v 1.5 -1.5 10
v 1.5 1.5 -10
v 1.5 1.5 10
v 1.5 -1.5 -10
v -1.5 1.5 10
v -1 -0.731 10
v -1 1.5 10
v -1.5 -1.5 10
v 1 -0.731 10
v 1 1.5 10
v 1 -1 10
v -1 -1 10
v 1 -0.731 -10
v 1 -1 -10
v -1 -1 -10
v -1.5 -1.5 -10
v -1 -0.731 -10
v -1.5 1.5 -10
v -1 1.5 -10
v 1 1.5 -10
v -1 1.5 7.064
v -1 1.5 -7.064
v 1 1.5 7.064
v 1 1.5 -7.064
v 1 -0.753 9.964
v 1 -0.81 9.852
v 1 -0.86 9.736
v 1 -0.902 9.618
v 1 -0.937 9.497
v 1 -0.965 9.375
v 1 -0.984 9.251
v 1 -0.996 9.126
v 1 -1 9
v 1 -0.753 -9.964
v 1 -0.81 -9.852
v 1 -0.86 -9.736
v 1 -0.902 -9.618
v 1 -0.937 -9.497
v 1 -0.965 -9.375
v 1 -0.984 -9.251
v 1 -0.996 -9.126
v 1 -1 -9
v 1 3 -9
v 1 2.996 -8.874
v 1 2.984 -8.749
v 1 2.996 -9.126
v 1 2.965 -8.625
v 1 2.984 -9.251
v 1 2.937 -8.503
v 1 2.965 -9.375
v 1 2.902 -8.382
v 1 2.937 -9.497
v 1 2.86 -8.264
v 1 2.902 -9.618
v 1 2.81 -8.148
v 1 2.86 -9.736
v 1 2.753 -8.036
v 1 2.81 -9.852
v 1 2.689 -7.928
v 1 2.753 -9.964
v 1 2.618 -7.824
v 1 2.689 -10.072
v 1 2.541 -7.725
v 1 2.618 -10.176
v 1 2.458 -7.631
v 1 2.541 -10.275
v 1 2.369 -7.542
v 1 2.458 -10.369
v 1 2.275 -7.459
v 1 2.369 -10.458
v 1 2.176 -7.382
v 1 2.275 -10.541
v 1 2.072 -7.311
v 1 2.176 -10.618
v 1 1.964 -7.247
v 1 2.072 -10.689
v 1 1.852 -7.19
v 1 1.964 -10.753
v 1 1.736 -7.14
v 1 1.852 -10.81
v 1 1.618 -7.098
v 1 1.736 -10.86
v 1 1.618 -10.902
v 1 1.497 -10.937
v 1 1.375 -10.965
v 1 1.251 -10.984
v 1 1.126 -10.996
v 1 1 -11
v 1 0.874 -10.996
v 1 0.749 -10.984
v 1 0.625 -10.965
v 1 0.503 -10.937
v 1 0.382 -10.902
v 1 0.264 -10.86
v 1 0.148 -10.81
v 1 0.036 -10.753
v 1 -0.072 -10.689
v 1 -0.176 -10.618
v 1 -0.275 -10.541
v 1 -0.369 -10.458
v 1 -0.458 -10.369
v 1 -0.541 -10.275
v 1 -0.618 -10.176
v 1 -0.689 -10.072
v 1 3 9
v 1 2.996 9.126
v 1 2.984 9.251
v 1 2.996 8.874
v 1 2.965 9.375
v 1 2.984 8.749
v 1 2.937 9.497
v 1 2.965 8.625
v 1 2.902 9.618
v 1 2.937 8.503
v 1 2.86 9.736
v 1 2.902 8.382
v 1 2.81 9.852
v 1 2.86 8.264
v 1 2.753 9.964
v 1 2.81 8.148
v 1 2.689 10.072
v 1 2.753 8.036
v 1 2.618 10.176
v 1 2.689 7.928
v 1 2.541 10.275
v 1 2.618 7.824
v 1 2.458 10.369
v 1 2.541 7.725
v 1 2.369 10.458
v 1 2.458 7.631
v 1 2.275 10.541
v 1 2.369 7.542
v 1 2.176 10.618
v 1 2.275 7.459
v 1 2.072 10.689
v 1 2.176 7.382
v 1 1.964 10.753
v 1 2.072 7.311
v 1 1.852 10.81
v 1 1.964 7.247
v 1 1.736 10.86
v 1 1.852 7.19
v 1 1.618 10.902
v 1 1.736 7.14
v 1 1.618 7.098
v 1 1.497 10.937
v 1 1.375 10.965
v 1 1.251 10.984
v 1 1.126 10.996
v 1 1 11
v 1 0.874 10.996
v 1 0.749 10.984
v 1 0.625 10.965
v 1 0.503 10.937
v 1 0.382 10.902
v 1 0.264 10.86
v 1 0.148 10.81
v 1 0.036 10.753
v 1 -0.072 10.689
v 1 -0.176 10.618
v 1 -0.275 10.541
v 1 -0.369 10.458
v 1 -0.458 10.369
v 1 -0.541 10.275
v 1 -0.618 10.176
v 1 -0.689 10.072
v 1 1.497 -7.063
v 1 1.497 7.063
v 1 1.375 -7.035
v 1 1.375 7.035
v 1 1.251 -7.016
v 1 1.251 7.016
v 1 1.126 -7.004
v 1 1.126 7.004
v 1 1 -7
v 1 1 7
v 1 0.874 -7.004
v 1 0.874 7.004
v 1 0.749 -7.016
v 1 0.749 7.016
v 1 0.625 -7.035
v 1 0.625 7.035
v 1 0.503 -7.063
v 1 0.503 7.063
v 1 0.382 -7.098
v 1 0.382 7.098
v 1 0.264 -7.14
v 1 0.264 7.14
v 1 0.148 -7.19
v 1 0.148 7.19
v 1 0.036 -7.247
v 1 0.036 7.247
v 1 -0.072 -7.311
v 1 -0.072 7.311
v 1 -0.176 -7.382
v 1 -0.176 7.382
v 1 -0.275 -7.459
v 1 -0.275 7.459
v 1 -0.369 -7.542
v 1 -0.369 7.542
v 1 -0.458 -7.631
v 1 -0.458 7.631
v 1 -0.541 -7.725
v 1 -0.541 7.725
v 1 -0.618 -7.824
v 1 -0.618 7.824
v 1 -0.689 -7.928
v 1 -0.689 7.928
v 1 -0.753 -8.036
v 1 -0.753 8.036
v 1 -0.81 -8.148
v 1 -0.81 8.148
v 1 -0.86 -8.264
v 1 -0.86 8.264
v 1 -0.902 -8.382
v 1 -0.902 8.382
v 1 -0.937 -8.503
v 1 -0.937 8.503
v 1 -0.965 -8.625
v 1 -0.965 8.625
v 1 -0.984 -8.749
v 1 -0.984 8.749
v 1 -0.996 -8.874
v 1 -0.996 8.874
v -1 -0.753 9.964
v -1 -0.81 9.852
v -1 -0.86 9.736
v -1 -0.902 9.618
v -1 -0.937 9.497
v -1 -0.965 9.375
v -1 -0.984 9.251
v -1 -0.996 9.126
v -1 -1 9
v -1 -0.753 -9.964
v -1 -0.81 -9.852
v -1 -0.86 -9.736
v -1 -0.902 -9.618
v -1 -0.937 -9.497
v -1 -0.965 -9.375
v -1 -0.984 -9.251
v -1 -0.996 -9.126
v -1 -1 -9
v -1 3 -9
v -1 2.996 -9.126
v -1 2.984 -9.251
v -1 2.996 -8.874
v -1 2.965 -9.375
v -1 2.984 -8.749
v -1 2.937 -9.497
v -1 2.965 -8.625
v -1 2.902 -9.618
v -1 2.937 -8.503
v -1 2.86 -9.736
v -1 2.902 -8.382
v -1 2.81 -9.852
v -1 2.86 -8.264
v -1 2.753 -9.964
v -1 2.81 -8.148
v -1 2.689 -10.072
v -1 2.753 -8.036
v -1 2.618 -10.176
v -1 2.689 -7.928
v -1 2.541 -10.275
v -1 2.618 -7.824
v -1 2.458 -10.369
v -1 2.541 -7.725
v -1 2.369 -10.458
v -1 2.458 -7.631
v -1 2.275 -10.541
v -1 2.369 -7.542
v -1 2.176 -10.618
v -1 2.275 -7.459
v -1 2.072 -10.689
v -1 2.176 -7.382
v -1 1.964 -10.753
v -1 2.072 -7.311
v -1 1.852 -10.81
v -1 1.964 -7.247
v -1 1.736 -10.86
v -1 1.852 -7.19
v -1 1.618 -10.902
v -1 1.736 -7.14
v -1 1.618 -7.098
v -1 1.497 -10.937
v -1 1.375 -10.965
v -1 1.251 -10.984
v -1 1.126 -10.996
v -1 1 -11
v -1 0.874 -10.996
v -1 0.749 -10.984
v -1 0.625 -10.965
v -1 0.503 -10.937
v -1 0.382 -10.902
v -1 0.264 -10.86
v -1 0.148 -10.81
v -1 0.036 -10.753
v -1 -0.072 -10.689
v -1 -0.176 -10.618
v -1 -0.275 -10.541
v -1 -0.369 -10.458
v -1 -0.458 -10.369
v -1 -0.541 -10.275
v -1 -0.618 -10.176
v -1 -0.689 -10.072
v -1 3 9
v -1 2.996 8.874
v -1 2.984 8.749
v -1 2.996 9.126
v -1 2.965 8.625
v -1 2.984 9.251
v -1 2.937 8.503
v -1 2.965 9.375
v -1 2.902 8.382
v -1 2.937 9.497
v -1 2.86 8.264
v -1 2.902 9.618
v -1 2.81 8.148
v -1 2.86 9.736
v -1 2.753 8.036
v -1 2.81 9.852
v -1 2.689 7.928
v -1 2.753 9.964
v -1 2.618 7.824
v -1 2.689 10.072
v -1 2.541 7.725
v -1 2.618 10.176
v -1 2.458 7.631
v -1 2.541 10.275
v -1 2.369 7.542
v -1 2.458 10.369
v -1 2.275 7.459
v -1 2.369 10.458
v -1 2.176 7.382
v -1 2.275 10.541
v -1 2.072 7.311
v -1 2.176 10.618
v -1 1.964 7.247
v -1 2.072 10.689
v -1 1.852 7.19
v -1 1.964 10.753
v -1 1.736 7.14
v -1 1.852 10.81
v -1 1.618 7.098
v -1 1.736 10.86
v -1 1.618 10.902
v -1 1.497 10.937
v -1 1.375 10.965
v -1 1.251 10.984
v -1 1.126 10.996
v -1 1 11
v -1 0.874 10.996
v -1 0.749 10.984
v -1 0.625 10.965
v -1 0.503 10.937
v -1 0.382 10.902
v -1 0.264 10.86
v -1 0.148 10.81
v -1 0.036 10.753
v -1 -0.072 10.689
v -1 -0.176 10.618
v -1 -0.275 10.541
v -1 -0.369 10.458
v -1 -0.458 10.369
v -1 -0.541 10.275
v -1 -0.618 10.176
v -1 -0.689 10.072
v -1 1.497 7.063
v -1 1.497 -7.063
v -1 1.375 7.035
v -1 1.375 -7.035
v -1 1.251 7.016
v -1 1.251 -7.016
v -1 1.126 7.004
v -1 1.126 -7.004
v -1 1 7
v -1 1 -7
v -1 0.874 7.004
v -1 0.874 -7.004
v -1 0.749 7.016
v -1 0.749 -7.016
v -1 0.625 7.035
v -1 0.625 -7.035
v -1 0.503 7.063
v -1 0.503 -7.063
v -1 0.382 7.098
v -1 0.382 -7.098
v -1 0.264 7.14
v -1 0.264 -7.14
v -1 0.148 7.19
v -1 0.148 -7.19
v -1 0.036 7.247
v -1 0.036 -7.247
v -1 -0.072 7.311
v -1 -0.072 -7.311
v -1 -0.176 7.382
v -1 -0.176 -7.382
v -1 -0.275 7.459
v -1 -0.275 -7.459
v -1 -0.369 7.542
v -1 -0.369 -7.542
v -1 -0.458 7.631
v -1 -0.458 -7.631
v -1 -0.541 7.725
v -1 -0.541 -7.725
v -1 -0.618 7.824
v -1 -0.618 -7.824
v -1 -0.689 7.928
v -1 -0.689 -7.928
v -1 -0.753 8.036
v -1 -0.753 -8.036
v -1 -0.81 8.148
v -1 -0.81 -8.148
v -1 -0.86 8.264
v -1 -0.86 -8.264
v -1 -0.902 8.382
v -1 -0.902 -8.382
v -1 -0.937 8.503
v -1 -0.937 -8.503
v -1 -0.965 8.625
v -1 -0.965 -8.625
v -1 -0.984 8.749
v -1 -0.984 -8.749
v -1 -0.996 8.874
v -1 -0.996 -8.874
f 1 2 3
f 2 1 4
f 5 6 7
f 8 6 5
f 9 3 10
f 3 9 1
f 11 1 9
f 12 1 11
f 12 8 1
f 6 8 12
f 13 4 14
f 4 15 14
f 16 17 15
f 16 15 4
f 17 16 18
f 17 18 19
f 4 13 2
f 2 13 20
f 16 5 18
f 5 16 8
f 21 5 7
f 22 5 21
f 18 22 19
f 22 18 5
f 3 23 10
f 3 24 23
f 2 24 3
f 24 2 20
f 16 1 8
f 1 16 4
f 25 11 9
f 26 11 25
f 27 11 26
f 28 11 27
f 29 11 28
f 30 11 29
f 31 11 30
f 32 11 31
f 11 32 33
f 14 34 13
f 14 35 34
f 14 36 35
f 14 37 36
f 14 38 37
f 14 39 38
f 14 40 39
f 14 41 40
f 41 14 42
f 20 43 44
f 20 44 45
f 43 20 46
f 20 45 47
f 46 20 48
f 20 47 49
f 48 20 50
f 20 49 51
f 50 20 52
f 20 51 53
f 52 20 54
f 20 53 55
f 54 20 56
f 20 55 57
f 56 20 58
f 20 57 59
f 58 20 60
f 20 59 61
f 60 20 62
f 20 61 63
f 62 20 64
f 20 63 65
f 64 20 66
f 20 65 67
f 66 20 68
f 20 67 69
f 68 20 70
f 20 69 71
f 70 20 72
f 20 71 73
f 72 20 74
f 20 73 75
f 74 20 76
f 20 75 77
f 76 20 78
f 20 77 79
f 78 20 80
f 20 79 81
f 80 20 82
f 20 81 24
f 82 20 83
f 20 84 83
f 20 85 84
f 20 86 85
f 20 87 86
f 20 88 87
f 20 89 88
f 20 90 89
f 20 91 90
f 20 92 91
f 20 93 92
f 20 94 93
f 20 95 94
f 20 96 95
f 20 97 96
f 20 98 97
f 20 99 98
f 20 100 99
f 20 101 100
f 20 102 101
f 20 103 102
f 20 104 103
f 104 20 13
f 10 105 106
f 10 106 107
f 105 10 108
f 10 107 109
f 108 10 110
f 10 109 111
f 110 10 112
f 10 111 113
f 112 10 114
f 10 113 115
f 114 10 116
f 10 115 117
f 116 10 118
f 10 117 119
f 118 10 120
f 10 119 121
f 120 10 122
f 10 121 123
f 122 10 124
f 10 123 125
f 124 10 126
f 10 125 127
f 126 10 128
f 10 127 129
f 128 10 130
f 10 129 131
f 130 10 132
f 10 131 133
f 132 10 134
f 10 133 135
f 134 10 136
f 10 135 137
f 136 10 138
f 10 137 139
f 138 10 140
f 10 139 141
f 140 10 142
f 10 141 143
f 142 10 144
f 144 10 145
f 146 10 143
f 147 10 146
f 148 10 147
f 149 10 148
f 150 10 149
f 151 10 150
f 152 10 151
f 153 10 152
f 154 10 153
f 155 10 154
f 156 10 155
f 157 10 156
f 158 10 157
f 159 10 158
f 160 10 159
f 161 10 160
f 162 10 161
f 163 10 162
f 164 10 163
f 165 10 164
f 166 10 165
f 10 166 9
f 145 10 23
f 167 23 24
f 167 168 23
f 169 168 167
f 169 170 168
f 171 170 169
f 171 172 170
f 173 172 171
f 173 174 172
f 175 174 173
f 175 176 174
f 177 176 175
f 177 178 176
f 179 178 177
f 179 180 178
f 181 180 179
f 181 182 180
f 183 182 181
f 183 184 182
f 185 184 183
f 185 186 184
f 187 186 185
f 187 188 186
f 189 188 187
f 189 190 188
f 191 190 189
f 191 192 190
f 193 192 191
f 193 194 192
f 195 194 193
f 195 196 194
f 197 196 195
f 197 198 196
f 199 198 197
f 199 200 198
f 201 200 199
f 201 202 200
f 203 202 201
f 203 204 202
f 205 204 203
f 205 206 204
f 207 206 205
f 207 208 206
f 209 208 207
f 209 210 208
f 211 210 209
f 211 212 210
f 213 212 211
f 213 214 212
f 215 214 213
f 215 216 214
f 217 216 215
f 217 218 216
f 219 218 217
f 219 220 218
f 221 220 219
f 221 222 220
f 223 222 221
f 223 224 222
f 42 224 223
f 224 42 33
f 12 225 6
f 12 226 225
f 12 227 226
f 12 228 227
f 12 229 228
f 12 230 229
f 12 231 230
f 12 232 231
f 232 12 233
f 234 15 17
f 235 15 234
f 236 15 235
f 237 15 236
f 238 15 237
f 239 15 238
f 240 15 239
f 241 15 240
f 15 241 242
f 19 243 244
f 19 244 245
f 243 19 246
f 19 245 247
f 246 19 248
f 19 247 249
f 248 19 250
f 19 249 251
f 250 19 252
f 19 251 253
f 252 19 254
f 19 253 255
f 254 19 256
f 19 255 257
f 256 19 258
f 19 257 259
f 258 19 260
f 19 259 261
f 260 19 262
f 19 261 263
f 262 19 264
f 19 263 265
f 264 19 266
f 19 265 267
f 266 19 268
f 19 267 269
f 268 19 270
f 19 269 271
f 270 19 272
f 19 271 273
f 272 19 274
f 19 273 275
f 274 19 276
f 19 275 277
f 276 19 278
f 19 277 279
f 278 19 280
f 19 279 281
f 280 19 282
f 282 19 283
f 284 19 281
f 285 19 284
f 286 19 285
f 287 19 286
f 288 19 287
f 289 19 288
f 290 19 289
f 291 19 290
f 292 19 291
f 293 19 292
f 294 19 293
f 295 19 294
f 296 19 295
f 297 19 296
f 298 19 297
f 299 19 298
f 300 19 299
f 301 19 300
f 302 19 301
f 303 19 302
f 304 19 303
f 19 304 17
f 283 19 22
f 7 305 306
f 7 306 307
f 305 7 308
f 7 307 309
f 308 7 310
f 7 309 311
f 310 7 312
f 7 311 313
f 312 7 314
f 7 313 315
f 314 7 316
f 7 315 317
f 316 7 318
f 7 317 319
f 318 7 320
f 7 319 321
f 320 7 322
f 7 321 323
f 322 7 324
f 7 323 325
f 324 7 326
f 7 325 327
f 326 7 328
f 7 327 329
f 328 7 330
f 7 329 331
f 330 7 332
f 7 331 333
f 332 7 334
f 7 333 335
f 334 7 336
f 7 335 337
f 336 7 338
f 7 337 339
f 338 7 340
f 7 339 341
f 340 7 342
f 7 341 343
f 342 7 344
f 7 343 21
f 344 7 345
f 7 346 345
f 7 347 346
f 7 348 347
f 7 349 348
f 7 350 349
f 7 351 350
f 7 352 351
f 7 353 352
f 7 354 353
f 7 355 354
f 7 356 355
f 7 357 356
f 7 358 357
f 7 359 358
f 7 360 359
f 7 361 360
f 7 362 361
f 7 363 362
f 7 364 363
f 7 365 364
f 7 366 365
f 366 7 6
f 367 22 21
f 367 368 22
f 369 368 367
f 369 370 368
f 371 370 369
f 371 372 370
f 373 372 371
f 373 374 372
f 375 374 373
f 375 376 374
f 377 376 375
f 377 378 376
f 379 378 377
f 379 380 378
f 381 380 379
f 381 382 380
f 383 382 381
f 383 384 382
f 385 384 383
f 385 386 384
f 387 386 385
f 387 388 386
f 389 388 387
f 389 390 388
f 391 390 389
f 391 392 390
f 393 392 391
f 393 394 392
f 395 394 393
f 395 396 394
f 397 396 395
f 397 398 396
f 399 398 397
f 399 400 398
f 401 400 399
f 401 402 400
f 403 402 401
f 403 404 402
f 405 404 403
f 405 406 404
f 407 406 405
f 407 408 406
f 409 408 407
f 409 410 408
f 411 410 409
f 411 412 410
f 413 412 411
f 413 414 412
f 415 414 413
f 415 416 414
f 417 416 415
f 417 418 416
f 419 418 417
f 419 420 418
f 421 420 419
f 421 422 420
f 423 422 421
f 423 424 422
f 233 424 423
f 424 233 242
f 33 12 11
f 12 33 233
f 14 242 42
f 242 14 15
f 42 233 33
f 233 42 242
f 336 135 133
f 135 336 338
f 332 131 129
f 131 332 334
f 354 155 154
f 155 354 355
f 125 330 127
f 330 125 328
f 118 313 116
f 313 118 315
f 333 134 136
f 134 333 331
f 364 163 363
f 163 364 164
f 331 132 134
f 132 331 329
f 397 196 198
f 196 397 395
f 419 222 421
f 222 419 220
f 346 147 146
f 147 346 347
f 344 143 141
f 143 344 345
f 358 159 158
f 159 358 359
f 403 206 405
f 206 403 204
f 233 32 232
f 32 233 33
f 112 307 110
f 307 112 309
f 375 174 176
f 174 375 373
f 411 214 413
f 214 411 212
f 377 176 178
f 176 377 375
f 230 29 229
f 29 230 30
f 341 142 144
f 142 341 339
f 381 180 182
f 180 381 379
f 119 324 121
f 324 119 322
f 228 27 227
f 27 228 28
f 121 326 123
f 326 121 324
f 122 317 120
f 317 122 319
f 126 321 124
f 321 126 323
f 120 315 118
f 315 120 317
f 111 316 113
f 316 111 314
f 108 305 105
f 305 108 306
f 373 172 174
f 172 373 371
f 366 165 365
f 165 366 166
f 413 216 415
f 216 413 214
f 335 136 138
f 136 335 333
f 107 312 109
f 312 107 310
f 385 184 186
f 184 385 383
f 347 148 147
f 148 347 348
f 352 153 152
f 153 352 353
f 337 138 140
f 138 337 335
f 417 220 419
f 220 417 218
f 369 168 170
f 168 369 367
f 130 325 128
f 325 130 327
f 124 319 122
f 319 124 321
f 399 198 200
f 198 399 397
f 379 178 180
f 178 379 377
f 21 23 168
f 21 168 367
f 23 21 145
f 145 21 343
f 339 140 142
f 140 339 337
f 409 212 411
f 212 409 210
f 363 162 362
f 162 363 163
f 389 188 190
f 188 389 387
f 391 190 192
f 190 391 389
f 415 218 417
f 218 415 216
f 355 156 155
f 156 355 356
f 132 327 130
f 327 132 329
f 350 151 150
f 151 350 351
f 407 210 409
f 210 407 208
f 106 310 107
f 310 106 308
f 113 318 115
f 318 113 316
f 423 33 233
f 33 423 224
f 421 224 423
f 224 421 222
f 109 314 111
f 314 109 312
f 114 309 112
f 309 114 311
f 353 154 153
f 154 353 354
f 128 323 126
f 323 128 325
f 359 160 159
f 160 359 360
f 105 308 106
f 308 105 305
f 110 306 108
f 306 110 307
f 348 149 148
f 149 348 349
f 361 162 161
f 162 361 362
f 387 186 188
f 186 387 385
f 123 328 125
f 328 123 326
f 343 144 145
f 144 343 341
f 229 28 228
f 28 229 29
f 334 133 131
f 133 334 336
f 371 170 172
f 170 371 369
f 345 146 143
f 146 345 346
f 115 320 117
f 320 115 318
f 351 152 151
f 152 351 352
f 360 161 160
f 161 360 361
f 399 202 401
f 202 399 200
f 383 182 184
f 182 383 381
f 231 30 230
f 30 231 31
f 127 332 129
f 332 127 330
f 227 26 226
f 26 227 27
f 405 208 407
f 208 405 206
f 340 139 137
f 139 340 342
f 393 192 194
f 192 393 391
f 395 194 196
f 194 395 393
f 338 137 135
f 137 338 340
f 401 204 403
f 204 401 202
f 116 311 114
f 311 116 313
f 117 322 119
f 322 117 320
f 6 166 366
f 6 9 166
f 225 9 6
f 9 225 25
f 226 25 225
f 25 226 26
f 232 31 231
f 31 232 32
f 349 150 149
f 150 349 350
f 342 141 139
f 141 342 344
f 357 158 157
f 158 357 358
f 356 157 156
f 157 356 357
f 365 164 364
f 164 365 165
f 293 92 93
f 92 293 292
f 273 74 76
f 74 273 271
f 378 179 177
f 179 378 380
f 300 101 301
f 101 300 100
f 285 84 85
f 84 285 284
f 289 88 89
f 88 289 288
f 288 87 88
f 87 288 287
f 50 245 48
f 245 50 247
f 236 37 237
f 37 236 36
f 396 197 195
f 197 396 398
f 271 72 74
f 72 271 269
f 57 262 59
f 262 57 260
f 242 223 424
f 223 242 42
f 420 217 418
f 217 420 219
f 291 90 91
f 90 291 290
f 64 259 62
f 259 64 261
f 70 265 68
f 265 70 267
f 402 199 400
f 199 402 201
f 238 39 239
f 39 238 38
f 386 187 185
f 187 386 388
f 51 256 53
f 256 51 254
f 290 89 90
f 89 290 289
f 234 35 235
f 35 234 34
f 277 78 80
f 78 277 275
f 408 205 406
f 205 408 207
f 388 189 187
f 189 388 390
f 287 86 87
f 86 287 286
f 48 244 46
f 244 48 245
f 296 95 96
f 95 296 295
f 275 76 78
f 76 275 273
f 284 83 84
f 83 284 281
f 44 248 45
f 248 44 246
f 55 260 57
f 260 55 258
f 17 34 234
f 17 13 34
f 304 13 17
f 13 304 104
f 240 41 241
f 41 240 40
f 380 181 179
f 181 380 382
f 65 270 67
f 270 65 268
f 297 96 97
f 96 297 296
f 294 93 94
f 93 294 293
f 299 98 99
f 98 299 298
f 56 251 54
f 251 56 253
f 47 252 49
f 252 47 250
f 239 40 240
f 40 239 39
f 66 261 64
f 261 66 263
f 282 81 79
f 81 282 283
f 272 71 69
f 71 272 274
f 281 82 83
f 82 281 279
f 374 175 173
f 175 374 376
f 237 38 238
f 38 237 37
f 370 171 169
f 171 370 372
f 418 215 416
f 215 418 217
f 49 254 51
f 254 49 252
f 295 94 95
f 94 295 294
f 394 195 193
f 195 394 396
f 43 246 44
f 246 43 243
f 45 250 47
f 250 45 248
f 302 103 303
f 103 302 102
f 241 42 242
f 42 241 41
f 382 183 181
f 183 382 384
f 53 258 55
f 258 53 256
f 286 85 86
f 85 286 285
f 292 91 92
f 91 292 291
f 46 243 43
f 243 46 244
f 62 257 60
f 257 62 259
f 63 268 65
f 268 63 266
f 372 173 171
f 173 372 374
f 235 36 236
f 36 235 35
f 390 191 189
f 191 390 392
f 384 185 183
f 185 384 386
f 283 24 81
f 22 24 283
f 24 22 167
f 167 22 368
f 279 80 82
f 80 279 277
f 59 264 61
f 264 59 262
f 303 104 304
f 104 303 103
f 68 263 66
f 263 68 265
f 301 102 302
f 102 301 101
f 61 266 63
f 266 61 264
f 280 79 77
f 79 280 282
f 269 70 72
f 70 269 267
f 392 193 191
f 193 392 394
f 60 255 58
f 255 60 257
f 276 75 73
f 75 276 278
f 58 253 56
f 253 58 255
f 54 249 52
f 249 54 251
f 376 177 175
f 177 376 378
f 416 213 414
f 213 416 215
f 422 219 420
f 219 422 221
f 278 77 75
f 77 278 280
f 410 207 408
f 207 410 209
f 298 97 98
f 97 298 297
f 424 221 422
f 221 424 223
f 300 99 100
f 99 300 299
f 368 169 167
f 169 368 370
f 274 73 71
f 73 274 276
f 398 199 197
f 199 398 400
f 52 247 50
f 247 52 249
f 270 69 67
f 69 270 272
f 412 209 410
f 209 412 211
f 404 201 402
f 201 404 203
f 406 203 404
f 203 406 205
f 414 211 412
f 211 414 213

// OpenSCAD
$fn = 100;
module channel(){
difference(){
  cube([3,3,20],center=true);
  translate([0,.5,0]){
  cube([2,3,20],center=true);
  }
}
}

module wheel() {
  rotate(a=90,v=[0,1,0]) {
      cylinder(h=2,r=2,center=1);
    }
}

module wheels(){
  translate([-1,1,9]){
    wheel();
  }
translate([-1,1,-9]){
    wheel();
  }
}

channel();
wheels();
